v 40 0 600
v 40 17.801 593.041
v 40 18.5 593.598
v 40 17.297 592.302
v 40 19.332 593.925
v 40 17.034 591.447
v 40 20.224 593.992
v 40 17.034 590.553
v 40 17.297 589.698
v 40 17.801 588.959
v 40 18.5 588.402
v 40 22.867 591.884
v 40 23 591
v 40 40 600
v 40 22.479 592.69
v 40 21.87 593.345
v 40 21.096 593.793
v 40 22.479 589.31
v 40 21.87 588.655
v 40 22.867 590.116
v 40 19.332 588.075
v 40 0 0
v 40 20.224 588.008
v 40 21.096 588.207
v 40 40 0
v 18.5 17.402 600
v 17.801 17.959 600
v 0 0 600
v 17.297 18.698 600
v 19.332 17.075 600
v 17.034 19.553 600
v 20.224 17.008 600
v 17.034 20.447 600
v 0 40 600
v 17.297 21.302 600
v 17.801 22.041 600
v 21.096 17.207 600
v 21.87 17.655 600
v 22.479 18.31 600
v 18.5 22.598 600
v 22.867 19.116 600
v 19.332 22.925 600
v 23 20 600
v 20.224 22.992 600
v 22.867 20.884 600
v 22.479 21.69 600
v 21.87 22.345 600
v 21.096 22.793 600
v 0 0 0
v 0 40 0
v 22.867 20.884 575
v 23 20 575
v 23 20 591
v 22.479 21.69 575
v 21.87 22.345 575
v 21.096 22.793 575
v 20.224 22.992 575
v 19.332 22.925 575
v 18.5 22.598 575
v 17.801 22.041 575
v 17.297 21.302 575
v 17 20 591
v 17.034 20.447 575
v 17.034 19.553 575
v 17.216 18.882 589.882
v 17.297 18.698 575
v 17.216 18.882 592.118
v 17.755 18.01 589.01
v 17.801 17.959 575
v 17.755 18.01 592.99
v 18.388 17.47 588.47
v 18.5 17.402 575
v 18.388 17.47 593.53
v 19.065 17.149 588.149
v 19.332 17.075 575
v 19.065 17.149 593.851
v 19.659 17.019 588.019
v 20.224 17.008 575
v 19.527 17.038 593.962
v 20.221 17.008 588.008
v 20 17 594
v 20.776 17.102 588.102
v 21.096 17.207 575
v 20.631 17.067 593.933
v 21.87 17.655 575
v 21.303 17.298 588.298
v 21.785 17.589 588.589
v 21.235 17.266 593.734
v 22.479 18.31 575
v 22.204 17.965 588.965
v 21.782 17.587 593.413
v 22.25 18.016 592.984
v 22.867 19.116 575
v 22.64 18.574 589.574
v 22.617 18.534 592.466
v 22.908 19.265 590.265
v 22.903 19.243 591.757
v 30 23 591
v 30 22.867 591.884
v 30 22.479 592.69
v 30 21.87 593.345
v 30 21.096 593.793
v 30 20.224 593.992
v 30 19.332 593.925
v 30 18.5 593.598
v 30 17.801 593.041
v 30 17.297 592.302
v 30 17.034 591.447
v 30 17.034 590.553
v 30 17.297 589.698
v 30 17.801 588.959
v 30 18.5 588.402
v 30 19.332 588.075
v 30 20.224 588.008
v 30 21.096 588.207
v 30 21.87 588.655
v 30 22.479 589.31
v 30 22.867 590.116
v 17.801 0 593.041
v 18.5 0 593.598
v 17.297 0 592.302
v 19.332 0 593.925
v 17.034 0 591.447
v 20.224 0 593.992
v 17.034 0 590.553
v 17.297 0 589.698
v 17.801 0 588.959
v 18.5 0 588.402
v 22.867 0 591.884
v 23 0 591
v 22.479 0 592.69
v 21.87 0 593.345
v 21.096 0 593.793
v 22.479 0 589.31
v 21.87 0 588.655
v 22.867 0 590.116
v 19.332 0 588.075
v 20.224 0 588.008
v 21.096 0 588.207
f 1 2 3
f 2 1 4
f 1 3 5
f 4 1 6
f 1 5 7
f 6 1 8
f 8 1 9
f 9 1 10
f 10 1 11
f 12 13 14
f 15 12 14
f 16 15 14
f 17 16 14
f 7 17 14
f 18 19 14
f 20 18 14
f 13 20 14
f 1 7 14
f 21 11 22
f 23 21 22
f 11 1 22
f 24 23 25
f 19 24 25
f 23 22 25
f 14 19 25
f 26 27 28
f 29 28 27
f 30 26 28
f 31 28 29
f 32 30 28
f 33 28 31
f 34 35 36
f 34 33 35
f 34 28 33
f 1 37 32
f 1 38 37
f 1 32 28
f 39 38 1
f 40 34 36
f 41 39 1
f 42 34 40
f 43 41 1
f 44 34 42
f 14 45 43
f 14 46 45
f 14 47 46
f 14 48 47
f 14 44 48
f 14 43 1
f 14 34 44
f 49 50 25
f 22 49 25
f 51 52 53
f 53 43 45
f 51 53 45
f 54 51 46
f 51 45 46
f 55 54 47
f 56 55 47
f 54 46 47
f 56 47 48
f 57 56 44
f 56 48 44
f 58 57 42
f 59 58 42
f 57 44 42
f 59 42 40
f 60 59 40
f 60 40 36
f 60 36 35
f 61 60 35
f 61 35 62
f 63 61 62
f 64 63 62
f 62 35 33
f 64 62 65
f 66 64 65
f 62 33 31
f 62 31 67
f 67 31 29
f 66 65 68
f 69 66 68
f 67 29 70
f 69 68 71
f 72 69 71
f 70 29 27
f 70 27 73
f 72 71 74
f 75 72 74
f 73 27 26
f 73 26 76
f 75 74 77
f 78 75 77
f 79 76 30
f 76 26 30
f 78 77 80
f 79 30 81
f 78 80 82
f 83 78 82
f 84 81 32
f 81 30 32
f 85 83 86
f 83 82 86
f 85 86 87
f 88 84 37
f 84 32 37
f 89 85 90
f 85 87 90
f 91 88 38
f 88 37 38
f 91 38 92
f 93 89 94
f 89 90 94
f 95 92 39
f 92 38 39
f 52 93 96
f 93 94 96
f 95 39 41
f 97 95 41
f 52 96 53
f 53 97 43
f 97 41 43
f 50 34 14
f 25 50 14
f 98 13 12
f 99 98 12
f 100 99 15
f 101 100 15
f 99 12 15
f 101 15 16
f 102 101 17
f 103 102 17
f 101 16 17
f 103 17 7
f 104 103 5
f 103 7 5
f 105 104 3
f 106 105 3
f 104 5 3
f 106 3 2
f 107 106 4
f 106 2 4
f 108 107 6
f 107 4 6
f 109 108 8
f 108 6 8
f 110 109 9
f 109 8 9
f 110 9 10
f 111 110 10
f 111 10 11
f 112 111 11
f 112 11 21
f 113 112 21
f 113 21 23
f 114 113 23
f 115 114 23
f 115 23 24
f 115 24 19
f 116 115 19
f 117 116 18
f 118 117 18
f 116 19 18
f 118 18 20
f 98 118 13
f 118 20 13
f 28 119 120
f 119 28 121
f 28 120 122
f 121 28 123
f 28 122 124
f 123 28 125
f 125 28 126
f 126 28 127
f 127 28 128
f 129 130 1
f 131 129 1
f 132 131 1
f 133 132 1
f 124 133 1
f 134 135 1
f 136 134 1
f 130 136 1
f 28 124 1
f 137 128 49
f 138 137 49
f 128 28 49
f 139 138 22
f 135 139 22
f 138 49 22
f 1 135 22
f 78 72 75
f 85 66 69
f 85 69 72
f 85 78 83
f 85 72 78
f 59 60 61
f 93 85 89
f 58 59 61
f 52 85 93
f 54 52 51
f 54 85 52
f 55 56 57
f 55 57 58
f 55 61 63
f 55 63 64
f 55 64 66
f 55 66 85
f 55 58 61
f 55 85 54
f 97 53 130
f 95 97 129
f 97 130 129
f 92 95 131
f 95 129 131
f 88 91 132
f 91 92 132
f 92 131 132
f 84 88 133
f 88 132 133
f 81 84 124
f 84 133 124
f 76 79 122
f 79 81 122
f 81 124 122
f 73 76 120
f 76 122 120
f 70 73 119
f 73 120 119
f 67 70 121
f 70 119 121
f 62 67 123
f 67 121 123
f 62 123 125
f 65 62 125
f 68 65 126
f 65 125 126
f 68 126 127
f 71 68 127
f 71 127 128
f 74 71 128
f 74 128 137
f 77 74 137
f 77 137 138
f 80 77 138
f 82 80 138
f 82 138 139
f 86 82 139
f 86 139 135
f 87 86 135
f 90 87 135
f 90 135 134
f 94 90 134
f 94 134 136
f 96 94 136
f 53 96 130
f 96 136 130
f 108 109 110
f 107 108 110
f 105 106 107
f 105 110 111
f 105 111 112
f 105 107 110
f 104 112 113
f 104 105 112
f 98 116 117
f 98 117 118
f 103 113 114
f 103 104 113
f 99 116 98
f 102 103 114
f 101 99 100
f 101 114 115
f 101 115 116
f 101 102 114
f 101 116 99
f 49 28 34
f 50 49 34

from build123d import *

# Parameters (mm, degrees)
F0_W     = 40
F0_H     = 40
F1_DEPTH = 600
F2_R     = 3
F3_DEPTH = 25
F4_R     = 3
F5_DEPTH = 20
F6_R     = 3
F7_DEPTH = 10


with BuildPart() as f1:
    # F0 (on Top) → F1 (new body)
    with BuildSketch(Plane.XY):
        with Locations((20, 20)):
            Rectangle(F0_W, F0_H)
    extrude(amount=F1_DEPTH)

    # F2 (on face) → F3 (cut)
    with BuildSketch(Plane.XY.offset(600)):
        with Locations((20, 20)):
            Circle(F2_R)
    extrude(amount=-F3_DEPTH, mode=Mode.SUBTRACT)

    # F4 (on face) → F5 (cut)
    with BuildSketch(Plane.XZ):
        with Locations((20, 591)):
            Circle(F4_R)
    extrude(amount=-F5_DEPTH, mode=Mode.SUBTRACT)

    # F6 (on face) → F7 (cut)
    with BuildSketch(Plane.YZ.offset(40)):
        with Locations((20, 591)):
            Circle(F6_R)
    extrude(amount=-F7_DEPTH, mode=Mode.SUBTRACT)


solid = f1.part
